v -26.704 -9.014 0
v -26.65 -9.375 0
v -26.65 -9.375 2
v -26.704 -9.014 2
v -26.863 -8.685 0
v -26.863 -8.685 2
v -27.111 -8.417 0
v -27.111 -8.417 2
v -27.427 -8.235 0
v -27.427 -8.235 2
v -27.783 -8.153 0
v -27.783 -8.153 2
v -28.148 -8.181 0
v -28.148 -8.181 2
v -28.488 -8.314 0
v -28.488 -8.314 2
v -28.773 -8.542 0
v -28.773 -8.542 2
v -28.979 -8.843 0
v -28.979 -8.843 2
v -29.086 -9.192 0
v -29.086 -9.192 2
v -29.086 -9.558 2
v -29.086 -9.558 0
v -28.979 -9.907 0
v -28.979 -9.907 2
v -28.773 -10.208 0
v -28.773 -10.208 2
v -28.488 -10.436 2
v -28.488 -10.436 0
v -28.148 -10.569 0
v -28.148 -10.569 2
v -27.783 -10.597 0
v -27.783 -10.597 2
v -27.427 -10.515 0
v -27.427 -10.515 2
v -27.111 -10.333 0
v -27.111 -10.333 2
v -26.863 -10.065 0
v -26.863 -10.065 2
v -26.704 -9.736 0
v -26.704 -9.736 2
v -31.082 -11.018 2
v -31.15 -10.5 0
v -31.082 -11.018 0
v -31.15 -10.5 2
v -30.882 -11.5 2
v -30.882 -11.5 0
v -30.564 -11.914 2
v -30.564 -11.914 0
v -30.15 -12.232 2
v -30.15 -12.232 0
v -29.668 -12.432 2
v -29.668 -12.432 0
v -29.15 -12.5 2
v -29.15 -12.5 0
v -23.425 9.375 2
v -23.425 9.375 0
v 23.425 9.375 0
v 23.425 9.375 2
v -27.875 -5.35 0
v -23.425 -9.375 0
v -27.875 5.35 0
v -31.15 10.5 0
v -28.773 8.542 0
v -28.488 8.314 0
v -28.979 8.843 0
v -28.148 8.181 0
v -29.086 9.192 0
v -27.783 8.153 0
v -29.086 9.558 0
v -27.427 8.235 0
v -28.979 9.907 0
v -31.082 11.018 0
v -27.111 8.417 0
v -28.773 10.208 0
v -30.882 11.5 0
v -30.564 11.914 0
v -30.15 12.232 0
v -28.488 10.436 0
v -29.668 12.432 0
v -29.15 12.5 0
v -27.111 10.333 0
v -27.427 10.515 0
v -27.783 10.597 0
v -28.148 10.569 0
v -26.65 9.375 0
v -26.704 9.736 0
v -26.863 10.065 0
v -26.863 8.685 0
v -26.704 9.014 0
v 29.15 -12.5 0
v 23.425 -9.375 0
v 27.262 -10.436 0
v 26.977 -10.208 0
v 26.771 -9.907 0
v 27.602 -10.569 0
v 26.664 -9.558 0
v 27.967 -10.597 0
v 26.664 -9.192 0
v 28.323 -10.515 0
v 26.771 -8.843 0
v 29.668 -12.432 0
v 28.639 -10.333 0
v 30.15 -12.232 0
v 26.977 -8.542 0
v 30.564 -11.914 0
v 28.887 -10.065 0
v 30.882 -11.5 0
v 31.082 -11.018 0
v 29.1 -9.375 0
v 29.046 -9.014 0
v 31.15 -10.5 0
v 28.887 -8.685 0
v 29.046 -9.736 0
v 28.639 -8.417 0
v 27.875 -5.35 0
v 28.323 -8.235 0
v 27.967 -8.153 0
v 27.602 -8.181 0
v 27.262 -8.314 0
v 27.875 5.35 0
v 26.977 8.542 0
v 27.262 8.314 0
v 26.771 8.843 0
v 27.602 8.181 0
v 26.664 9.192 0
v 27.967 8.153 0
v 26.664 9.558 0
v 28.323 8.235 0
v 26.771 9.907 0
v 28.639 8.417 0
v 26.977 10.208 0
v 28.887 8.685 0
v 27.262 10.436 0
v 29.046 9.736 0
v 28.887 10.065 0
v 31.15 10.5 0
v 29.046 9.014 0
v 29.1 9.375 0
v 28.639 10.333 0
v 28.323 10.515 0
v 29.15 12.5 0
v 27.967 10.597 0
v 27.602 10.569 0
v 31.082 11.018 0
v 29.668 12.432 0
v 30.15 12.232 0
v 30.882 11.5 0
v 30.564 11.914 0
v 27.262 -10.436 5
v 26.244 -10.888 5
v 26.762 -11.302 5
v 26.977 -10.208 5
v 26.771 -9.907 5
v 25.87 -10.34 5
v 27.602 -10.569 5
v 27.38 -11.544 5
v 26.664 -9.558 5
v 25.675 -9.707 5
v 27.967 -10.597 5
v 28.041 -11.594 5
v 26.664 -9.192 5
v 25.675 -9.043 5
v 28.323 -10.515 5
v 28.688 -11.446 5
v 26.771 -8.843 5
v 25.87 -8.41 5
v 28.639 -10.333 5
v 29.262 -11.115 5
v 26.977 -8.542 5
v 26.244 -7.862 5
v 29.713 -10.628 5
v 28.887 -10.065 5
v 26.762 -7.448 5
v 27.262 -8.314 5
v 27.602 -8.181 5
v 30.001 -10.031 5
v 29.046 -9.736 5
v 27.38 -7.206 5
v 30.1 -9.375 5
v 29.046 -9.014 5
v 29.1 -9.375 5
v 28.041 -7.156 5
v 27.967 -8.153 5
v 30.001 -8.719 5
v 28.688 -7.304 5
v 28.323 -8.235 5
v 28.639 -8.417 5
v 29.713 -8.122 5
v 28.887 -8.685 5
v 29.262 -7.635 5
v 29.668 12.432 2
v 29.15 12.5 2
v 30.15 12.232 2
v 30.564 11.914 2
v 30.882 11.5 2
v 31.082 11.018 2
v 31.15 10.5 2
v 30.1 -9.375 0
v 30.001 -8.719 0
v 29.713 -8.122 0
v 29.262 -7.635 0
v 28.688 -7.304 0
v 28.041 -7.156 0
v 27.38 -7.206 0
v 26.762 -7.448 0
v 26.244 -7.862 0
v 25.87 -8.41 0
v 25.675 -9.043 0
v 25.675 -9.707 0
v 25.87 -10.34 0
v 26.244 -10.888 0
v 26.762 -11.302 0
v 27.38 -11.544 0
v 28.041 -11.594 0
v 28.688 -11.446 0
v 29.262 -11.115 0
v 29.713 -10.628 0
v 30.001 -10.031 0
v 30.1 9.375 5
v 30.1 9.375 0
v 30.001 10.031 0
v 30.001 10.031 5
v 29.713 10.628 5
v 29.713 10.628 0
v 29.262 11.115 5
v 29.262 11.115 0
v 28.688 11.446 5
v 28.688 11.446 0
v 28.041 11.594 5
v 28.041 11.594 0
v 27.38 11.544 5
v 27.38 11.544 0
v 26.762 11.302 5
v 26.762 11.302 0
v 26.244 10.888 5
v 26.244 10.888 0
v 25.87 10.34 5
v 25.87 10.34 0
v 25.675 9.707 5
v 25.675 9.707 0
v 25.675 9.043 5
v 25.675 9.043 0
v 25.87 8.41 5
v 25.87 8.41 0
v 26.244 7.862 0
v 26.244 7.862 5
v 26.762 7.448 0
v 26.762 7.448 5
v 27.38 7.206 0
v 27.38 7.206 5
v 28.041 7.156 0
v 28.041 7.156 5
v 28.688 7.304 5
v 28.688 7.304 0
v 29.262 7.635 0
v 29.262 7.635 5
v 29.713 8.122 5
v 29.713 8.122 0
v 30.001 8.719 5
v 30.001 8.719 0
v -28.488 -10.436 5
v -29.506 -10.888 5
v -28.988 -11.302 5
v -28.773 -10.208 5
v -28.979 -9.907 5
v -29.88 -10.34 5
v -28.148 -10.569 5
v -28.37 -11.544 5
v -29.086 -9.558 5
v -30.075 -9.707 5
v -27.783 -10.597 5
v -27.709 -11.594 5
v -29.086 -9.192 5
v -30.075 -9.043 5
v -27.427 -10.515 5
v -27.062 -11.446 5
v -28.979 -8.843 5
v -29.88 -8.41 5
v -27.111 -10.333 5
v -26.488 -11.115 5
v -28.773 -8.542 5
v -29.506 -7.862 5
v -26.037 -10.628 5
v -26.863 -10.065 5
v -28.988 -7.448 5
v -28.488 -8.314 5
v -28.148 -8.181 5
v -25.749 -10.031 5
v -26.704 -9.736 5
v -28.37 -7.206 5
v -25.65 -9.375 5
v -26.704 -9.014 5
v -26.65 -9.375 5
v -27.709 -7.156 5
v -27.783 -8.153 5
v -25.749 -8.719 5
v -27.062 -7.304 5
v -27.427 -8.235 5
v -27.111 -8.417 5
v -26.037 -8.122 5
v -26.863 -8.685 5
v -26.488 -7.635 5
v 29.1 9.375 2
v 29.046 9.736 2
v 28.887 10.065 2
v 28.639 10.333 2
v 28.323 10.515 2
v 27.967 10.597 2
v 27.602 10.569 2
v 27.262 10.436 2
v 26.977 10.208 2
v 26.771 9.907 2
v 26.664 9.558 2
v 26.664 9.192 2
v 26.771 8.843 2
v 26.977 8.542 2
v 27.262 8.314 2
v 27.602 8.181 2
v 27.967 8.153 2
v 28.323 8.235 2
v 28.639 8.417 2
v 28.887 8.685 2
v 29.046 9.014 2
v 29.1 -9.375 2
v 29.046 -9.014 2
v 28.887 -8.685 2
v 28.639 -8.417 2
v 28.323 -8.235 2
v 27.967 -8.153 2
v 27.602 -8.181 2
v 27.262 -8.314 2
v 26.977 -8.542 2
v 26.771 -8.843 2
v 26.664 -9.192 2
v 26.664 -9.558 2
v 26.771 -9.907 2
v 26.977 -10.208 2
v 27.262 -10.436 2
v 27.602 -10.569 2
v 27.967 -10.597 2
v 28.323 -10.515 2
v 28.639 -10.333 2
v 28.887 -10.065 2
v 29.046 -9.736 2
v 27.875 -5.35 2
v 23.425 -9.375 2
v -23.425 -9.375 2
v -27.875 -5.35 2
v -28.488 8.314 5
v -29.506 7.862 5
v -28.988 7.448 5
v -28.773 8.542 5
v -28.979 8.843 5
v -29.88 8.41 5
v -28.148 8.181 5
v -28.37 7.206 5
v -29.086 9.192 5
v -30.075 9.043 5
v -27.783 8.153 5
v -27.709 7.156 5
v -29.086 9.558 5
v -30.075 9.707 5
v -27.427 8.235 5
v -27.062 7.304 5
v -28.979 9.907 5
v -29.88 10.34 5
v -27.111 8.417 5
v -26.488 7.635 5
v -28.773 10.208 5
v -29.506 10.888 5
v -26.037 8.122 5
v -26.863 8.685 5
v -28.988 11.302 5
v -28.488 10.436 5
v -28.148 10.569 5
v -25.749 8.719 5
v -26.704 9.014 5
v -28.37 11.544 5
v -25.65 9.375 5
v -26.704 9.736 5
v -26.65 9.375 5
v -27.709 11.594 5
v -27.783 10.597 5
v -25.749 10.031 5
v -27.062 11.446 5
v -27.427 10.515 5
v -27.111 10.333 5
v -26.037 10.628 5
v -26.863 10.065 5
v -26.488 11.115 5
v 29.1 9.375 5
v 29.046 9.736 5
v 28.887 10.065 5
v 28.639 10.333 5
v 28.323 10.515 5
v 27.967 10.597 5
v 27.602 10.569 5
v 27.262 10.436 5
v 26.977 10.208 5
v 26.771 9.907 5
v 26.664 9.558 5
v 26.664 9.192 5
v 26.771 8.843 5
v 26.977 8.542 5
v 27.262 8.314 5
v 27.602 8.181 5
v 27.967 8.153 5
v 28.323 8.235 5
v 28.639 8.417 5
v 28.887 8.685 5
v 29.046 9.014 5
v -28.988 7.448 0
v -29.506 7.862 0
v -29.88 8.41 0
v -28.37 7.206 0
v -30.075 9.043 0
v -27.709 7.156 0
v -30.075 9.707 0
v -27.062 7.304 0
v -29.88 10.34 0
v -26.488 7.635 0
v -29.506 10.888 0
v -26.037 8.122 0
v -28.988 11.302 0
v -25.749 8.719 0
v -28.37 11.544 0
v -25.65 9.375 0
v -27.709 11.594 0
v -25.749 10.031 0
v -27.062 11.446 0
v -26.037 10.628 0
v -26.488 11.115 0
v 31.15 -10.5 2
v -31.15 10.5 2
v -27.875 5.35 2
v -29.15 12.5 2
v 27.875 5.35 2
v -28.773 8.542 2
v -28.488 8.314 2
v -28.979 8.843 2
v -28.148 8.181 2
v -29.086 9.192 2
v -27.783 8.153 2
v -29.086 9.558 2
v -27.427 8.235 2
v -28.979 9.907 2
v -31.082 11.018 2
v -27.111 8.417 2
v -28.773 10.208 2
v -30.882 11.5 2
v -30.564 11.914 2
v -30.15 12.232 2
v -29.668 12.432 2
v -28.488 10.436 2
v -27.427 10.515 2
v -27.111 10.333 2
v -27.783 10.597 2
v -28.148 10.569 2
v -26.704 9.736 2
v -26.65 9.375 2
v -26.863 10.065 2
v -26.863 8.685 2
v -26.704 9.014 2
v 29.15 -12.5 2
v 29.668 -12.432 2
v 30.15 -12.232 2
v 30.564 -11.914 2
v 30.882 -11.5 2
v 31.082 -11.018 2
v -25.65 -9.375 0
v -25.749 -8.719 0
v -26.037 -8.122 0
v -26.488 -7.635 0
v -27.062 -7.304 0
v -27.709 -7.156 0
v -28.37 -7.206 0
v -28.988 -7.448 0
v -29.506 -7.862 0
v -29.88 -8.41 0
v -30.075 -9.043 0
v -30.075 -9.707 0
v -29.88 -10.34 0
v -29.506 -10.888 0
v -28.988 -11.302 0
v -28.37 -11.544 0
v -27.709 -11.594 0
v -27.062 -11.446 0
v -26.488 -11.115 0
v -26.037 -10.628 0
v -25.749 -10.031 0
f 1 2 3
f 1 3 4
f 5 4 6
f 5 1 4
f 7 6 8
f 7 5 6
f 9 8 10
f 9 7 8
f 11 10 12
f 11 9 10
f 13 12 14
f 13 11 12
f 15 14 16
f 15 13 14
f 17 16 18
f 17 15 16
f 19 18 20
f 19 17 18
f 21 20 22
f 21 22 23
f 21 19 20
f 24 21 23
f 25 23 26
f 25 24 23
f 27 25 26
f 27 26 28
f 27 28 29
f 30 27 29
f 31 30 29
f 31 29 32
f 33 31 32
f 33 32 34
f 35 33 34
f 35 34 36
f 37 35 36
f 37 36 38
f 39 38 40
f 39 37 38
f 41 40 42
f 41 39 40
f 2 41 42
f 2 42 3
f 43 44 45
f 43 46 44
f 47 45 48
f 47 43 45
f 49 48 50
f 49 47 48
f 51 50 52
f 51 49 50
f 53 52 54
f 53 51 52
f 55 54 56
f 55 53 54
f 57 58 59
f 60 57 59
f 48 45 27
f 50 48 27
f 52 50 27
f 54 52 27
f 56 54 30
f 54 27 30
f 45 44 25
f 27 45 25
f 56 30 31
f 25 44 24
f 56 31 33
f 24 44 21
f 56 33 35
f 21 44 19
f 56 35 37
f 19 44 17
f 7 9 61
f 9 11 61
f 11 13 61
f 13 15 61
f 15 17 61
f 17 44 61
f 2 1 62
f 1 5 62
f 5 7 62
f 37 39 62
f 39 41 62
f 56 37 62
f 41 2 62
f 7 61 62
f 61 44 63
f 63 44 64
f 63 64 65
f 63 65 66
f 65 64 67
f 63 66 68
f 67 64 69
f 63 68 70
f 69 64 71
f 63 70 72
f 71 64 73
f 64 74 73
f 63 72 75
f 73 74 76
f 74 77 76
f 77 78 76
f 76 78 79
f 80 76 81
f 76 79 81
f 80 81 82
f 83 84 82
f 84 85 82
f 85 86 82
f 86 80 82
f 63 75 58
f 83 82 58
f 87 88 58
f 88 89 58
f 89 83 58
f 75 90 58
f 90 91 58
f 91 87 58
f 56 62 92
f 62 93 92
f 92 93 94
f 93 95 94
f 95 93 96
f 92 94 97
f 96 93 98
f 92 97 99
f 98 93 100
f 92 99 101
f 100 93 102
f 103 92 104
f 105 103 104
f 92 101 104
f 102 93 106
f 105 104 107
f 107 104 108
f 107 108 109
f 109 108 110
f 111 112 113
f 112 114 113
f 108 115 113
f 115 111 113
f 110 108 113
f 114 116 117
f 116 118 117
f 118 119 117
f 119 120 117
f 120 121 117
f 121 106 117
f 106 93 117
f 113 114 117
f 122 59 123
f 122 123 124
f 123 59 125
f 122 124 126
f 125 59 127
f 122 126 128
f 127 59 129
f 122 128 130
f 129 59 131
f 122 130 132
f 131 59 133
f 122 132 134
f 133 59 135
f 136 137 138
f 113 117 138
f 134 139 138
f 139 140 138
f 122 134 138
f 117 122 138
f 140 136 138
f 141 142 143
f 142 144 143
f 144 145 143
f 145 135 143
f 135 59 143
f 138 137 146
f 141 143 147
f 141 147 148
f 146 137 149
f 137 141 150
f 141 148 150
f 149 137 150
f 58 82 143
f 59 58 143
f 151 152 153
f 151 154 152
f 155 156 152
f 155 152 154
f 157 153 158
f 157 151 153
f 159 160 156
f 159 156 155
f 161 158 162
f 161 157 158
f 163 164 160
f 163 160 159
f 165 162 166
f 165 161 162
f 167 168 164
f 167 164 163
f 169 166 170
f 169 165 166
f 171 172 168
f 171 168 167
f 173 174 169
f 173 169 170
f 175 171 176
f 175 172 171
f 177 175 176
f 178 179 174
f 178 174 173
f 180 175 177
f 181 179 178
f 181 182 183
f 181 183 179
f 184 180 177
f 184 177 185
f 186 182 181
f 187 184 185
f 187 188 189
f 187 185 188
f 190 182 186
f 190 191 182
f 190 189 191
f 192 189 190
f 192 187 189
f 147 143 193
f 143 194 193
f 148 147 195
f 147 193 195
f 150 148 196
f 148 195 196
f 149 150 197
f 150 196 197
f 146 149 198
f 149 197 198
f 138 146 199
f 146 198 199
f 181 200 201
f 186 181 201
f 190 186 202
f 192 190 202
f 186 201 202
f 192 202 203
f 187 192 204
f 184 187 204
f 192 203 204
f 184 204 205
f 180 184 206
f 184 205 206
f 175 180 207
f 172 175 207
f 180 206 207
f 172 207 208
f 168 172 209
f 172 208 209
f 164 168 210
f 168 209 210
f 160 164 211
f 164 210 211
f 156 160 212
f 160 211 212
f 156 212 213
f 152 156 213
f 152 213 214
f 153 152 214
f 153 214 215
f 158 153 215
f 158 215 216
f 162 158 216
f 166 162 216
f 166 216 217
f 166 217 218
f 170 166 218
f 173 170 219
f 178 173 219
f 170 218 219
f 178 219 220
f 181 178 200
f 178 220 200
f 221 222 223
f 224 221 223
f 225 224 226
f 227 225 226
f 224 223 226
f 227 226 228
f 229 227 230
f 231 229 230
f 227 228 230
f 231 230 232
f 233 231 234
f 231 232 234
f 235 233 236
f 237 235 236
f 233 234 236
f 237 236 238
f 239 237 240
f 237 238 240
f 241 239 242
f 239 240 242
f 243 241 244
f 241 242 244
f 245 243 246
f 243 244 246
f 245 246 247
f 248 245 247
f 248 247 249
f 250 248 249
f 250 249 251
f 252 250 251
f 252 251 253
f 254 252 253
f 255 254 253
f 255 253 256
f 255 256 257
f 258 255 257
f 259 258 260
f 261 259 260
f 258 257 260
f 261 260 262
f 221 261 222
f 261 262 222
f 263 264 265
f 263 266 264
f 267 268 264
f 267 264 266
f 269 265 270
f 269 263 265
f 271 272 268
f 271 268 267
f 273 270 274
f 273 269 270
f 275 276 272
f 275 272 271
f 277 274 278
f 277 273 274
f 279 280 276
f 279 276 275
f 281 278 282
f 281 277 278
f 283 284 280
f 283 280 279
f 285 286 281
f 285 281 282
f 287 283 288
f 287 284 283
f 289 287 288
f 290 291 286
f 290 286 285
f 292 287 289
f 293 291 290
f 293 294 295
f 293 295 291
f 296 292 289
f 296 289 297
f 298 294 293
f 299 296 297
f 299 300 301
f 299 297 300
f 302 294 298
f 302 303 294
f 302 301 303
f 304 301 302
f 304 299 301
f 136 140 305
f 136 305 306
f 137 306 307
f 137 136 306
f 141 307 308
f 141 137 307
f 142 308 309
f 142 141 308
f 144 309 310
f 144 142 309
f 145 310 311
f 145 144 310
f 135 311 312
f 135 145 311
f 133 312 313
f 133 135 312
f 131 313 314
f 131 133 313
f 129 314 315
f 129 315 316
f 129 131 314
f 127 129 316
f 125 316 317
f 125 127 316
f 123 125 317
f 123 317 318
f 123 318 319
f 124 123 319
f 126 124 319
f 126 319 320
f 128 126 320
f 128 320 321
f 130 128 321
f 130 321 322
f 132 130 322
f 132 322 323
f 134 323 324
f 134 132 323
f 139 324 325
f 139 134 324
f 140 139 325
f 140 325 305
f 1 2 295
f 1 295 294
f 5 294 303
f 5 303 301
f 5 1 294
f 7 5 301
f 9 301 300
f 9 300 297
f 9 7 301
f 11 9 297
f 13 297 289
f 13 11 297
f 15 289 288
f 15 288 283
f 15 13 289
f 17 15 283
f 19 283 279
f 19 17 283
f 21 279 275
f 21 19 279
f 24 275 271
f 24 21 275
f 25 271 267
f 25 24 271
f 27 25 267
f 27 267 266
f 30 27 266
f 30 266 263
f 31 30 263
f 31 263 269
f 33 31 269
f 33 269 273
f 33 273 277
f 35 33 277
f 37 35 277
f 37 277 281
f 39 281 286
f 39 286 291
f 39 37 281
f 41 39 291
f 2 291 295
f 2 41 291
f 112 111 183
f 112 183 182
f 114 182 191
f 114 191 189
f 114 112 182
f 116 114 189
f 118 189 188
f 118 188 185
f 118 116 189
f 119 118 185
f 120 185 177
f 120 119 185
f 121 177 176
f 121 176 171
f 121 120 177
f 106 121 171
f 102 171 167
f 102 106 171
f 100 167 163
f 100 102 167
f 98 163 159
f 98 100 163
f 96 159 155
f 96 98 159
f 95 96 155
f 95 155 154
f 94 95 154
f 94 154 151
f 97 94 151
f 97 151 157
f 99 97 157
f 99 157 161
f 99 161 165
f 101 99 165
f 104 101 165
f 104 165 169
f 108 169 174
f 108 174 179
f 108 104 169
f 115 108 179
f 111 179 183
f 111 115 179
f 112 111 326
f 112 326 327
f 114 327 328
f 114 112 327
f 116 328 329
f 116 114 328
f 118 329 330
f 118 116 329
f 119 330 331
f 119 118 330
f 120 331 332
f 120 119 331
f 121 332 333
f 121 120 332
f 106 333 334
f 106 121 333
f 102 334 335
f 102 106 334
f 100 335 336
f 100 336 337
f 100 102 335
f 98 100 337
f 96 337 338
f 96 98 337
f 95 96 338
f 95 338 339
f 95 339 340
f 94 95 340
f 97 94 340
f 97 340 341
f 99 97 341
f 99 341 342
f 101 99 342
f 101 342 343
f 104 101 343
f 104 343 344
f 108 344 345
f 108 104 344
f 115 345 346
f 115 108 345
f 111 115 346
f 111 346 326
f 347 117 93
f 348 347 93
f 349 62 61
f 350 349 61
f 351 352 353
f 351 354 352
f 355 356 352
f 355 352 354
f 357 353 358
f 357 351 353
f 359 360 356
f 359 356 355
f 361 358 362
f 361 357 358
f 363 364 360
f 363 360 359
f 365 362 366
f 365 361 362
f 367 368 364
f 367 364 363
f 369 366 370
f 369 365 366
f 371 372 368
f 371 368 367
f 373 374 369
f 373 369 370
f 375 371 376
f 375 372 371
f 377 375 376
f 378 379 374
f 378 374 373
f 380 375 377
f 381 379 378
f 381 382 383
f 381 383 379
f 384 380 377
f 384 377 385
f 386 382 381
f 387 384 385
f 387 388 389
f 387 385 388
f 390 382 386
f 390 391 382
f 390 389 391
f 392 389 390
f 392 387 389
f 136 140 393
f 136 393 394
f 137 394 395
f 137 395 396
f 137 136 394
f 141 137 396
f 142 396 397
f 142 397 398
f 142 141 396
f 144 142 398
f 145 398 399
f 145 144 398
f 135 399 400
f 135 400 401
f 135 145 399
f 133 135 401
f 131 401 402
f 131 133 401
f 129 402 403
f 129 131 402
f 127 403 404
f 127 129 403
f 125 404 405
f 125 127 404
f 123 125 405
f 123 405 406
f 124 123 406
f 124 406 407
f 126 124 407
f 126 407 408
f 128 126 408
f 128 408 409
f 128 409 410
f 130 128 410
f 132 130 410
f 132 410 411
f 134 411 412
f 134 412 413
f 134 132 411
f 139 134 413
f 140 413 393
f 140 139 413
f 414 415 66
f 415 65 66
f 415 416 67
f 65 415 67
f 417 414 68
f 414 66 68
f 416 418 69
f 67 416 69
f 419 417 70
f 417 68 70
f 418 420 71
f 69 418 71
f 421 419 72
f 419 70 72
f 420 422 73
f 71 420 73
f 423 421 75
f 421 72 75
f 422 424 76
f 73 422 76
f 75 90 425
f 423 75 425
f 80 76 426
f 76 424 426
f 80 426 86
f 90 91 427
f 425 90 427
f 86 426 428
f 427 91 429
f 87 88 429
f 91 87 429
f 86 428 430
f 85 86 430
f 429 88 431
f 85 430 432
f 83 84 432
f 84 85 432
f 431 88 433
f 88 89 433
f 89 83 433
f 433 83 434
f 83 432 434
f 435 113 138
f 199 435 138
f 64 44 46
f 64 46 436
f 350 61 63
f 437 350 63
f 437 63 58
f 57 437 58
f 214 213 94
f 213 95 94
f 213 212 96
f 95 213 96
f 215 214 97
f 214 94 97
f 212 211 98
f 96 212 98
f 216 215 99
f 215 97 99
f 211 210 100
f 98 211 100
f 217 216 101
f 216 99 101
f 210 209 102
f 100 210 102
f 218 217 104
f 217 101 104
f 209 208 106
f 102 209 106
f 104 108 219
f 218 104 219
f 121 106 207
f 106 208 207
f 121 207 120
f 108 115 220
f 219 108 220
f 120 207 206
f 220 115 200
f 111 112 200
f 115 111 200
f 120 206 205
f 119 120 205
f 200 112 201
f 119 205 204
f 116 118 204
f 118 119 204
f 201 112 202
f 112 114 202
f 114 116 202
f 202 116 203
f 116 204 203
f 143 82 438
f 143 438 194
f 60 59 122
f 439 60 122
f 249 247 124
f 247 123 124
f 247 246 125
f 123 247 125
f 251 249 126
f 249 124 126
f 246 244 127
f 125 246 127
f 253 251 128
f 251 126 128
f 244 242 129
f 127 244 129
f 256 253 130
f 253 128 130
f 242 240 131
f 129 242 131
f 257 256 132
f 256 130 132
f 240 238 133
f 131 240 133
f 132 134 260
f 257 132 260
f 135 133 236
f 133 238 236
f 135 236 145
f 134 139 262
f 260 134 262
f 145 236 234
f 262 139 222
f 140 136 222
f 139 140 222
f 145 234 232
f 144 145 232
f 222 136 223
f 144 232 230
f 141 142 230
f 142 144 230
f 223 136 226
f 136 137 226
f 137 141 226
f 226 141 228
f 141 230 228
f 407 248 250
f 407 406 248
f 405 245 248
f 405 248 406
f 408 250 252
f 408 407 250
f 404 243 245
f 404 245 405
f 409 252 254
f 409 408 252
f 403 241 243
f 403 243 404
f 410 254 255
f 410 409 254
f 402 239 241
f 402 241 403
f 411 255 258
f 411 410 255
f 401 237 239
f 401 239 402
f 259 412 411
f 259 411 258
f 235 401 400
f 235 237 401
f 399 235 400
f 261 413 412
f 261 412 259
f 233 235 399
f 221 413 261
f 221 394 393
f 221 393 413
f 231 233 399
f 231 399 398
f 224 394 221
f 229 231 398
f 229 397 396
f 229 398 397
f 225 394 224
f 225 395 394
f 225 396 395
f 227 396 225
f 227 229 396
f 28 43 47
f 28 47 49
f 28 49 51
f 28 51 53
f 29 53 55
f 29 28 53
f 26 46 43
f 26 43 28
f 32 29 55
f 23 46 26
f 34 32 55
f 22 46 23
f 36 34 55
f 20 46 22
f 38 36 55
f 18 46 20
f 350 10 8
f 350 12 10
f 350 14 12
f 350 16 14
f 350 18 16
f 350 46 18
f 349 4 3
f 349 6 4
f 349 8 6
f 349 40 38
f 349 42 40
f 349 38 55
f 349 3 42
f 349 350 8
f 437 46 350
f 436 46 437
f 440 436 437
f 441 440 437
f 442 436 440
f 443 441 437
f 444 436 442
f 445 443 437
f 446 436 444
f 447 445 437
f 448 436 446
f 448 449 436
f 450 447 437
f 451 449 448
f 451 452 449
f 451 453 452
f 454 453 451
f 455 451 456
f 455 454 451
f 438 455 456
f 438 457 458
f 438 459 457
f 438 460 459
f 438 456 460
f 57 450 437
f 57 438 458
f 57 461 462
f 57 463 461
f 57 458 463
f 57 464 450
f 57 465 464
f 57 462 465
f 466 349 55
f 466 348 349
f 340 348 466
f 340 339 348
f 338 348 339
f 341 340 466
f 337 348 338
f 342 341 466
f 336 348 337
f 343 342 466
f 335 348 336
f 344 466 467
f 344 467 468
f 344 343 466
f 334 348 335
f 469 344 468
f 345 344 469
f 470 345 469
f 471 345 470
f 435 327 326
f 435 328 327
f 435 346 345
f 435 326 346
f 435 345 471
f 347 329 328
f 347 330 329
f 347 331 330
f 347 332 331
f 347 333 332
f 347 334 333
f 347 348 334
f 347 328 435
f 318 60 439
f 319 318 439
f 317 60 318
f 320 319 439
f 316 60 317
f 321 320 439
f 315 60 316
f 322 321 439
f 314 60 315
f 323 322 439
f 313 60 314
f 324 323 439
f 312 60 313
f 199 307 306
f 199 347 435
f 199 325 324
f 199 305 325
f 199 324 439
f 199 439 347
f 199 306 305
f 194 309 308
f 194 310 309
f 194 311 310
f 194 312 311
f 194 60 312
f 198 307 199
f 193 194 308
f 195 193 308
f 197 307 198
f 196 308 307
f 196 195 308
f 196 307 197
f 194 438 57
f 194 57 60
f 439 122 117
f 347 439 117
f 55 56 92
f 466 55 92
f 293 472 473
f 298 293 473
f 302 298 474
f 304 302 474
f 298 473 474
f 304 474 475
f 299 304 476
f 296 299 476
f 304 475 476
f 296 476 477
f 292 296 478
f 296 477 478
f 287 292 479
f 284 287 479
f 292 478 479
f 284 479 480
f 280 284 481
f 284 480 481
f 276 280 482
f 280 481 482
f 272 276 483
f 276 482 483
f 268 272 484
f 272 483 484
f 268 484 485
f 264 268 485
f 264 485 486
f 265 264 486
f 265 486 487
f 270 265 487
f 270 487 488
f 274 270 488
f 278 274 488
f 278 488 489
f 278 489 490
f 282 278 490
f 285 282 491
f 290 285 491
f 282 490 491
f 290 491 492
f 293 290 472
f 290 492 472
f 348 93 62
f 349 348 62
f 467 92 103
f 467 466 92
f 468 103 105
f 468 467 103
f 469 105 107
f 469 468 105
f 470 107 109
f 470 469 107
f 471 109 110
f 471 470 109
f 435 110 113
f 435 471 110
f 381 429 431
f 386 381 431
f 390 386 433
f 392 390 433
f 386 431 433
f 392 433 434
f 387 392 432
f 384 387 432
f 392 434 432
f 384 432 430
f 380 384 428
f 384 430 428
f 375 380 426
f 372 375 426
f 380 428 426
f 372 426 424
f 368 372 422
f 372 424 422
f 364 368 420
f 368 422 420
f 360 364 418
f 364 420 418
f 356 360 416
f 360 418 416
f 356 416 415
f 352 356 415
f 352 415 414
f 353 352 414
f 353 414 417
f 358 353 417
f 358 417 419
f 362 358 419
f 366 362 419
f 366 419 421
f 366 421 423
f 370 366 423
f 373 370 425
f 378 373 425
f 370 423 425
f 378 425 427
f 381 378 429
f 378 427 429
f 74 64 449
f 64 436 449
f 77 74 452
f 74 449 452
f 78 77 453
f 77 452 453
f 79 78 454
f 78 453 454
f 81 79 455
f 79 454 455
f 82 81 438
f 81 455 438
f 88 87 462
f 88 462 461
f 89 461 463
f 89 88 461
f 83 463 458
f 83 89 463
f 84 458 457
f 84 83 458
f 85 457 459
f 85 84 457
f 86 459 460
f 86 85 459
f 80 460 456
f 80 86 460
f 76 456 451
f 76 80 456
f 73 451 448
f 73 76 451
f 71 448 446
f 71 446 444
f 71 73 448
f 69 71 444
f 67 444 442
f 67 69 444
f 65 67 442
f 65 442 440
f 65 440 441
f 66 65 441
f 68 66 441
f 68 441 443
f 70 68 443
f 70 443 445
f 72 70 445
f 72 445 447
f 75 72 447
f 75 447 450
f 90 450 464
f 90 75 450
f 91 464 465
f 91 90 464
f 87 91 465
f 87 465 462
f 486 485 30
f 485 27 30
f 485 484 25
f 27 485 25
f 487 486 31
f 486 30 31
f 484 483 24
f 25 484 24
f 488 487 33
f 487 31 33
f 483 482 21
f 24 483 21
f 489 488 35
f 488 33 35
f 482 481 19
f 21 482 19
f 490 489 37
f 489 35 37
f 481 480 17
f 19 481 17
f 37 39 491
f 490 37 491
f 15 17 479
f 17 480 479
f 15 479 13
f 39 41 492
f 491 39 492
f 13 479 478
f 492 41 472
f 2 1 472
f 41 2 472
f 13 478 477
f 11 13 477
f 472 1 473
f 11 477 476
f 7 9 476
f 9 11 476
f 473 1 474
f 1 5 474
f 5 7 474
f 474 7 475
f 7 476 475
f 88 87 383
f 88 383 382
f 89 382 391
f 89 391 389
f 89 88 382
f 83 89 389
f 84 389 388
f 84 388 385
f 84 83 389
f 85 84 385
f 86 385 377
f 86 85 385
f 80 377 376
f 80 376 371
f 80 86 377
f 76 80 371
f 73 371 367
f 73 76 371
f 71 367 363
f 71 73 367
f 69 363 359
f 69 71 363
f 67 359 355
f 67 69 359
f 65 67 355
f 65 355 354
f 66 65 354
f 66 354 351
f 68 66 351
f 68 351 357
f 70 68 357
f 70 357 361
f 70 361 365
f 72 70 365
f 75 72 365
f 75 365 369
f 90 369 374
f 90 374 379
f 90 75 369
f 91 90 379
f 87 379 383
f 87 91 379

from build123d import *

# Parameters (mm, degrees)
F0_W     = 62.3
F0_H     = 25
F0_R     = 2.225
F0_R_2   = 1.225
F1_DEPTH = 2
F2_DEPTH = 5
F3_R     = 2


with BuildPart() as f1:
    # F0 (on Top) → F1 (new body)
    with BuildSketch(Plane.XY):
        Rectangle(F0_W, F0_H)
        with Locations((-27.875, -9.375)):
            Circle(F0_R, mode=Mode.SUBTRACT)
        with Locations((27.875, -9.375)):
            Circle(F0_R, mode=Mode.SUBTRACT)
        with Locations((-27.875, 9.375)):
            Circle(F0_R, mode=Mode.SUBTRACT)
        Polygon((-27.875, 5.350242297), (-23.4251319759, 9.375), (23.4251319759, 9.375), (27.875, 5.350242297), (27.875, -5.350242297), (23.4251319759, -9.375), (-23.4251319759, -9.375), (-27.875, -5.350242297), align=None, mode=Mode.SUBTRACT)
        with Locations((27.875, 9.375)):
            Circle(F0_R, mode=Mode.SUBTRACT)
        with Locations((-27.875, 9.375)):
            Circle(F0_R)
        with Locations((-27.875, 9.375)):
            Circle(F0_R_2, mode=Mode.SUBTRACT)
        with Locations((-27.875, -9.375)):
            Circle(F0_R)
        with Locations((-27.875, -9.375)):
            Circle(F0_R_2, mode=Mode.SUBTRACT)
        with Locations((27.875, 9.375)):
            Circle(F0_R)
        with Locations((27.875, 9.375)):
            Circle(F0_R_2, mode=Mode.SUBTRACT)
        with Locations((27.875, -9.375)):
            Circle(F0_R)
        with Locations((27.875, -9.375)):
            Circle(F0_R_2, mode=Mode.SUBTRACT)
    extrude(amount=F1_DEPTH)

    # F3
    f3_edges = [f1.edges().sort_by_distance(p)[0] for p in [
        (-31.15, -12.5, 1),
        (-31.15, 12.5, 1),
        (31.15, 12.5, 1),
        (31.15, -12.5, 1),
    ]]
    fillet(f3_edges, radius=F3_R)


with BuildPart() as f2:
    # F0 (on Top) → F2 (new body)
    with BuildSketch(Plane.XY):
        with Locations((-27.875, 9.375)):
            Circle(F0_R)
        with Locations((-27.875, 9.375)):
            Circle(F0_R_2, mode=Mode.SUBTRACT)
    extrude(amount=F2_DEPTH)


with BuildPart() as f2b:
    # F0 (on Top) → F2, piece 2 (new body)
    with BuildSketch(Plane.XY):
        with Locations((-27.875, -9.375)):
            Circle(F0_R)
        with Locations((-27.875, -9.375)):
            Circle(F0_R_2, mode=Mode.SUBTRACT)
    extrude(amount=F2_DEPTH)


with BuildPart() as f2c:
    # F0 (on Top) → F2, piece 3 (new body)
    with BuildSketch(Plane.XY):
        with Locations((27.875, 9.375)):
            Circle(F0_R)
        with Locations((27.875, 9.375)):
            Circle(F0_R_2, mode=Mode.SUBTRACT)
    extrude(amount=F2_DEPTH)


with BuildPart() as f2d:
    # F0 (on Top) → F2, piece 4 (new body)
    with BuildSketch(Plane.XY):
        with Locations((27.875, -9.375)):
            Circle(F0_R)
        with Locations((27.875, -9.375)):
            Circle(F0_R_2, mode=Mode.SUBTRACT)
    extrude(amount=F2_DEPTH)


solid = Compound([f1.part, f2.part, f2b.part, f2c.part, f2d.part])
